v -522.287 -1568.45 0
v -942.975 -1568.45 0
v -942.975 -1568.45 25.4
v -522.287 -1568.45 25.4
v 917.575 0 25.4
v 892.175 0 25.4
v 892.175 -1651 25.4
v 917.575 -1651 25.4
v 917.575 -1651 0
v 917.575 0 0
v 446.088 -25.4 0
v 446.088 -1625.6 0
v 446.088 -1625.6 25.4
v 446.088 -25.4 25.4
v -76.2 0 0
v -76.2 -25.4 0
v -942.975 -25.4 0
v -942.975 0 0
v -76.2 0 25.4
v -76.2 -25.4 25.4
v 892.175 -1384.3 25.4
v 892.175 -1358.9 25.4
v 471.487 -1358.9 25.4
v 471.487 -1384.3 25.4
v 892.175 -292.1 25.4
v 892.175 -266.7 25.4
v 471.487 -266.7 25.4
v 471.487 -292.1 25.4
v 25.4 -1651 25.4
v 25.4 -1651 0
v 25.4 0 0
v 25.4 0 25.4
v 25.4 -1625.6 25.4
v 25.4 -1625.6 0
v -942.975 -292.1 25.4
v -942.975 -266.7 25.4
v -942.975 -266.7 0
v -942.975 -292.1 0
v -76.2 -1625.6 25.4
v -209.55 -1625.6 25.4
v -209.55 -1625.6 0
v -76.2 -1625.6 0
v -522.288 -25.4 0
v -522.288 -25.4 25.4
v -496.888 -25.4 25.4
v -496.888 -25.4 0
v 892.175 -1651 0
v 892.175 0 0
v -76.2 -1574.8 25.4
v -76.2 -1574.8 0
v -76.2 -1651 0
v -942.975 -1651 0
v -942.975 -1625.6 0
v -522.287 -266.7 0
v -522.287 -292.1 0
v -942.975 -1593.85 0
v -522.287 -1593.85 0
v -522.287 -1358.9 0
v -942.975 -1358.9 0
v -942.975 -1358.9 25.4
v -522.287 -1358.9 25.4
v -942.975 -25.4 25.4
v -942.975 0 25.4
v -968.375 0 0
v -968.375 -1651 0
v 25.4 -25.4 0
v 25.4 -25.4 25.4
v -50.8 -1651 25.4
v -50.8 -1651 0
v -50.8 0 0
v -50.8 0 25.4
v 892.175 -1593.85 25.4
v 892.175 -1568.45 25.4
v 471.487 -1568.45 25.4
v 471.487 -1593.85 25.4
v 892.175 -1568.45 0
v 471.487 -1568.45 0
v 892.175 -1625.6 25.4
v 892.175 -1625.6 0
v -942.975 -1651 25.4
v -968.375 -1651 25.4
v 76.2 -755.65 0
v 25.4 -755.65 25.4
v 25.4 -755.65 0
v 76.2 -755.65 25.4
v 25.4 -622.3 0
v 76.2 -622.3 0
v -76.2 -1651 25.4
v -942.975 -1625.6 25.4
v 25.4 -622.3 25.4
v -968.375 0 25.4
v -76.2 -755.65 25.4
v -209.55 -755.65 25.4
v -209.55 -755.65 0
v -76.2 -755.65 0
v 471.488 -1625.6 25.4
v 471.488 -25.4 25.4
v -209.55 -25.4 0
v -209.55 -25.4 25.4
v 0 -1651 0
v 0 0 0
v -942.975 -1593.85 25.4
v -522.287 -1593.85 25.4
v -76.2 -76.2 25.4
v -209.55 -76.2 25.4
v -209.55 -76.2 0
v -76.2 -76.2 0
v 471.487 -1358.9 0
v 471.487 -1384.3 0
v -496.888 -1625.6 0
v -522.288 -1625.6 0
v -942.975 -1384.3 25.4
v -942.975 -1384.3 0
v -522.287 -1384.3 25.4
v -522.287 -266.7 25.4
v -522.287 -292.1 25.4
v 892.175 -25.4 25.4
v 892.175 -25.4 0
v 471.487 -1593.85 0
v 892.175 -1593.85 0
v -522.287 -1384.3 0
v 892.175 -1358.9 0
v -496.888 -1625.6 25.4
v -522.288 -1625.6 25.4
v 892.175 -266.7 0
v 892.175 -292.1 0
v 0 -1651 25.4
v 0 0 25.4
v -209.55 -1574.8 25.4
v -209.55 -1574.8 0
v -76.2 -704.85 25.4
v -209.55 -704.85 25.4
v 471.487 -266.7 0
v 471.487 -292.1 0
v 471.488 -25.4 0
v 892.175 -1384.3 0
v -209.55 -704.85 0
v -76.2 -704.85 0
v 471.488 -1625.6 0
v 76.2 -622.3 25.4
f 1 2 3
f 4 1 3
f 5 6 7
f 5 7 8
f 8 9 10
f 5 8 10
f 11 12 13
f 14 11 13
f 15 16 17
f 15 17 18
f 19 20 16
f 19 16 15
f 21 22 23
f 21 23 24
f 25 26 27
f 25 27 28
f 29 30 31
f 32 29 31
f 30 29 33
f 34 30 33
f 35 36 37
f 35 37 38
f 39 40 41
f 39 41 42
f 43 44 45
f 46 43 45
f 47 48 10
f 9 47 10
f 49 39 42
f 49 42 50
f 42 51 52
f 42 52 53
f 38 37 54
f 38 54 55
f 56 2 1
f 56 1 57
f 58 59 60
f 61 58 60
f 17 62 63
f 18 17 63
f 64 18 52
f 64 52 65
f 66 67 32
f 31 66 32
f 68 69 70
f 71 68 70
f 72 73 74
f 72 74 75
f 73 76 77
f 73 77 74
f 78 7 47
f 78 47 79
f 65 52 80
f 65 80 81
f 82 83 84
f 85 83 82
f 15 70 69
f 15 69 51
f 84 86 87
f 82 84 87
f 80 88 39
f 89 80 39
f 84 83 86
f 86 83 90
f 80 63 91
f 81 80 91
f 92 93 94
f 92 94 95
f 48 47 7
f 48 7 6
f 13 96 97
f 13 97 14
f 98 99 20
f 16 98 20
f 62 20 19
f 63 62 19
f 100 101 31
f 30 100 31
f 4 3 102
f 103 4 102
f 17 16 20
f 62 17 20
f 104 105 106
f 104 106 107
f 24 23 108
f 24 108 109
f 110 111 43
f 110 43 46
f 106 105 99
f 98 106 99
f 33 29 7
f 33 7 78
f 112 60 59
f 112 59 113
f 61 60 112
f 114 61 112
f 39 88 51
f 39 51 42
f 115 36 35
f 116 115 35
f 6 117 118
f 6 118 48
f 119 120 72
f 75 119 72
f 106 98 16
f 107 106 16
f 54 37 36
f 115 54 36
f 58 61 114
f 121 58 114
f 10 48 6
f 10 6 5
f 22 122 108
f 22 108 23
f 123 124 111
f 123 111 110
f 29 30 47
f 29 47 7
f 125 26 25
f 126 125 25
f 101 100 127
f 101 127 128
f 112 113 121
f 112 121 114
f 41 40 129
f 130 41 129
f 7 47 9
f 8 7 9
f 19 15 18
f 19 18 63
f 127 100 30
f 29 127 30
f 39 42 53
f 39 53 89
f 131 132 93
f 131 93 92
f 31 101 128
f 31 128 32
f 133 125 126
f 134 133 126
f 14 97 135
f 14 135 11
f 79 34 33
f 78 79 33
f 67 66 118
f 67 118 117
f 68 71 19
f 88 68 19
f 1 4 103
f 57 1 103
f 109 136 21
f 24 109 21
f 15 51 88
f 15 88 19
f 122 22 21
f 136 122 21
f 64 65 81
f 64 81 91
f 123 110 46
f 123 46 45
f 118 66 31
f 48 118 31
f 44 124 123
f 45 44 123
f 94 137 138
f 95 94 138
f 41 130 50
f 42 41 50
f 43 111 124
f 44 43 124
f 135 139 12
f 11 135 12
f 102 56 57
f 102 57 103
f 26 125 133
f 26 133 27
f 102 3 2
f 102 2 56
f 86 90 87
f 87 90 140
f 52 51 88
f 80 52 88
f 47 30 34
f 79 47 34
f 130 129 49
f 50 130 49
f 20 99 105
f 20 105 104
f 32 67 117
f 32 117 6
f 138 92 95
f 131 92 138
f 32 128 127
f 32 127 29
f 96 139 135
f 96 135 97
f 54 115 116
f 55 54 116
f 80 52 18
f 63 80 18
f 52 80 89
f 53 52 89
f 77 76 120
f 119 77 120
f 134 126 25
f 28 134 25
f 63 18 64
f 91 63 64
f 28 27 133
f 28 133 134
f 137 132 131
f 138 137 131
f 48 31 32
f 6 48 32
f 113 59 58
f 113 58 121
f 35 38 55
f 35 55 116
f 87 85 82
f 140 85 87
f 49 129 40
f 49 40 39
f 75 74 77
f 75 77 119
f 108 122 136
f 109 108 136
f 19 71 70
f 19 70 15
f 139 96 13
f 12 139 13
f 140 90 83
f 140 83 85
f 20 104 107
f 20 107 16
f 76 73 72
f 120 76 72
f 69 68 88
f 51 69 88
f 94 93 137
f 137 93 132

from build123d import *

# Parameters (mm, degrees)
F0_W      = 25.4
F0_H      = 1651
F1_DEPTH  = 25.4
F2_W      = 25.4
F2_H      = 25.4
F3_DEPTH  = 866.775
F4_W      = 25.4
F4_H      = 25.4
F5_DEPTH  = 1600.2
F6_W      = 25.4
F6_H      = 25.4
F7_DEPTH  = 420.6875
F10_W     = 133.35
F10_H     = 50.8
F10_W_2   = 50.8
F10_H_2   = 133.35
F11_DEPTH = 25.4


with BuildPart() as f1:
    # F0 (on Top) → F1 (new body)
    with BuildSketch(Plane.XY):
        with Locations((12.7, -825.5)):
            Rectangle(F0_W, F0_H)
        with Locations((904.875, -825.5)):
            Rectangle(F0_W, F0_H)
    extrude(amount=F1_DEPTH)


with BuildPart() as f3:
    # F2 (on face) → F3 (new body, through all)
    with BuildSketch(Plane.YZ.offset(25.4)):
        with Locations((-12.7, 12.7)):
            Rectangle(F2_W, F2_H)
        with Locations((-1638.3, 12.7)):
            Rectangle(F2_W, F2_H)
    extrude(amount=F3_DEPTH)


with BuildPart() as f5:
    # F4 (on face) → F5 (new body, through all)
    with BuildSketch(Plane(origin=(0, -1625.6, 0), x_dir=(-1, 0, 0), z_dir=(0, 1, 0))):
        with Locations((-458.7875, 12.7)):
            Rectangle(F4_W, F4_H)
    extrude(amount=F5_DEPTH)


with BuildPart() as f7:
    # F6 (on face) → F7 (new body, through all)
    with BuildSketch(Plane(origin=(892.175, 0, 0), x_dir=(0, -1, 0), z_dir=(-1, 0, 0))):
        with Locations((279.4, 12.7)):
            Rectangle(F6_W, F6_H)
        with Locations((1581.15, 12.7)):
            Rectangle(F6_W, F6_H)
        with Locations((1371.6, 12.7)):
            Rectangle(F6_W, F6_H)
    extrude(amount=F7_DEPTH)


with BuildPart() as f9_1:
    # F9: instance of F1
    add(f1.part.mirror(Plane(origin=(-25.4, -825.5, 12.7), x_dir=(0, -1, 0), z_dir=(-1, 0, 0))))


with BuildPart() as f9_2:
    # F9: instance of F7
    add(f7.part.mirror(Plane(origin=(-25.4, -825.5, 12.7), x_dir=(0, -1, 0), z_dir=(-1, 0, 0))))


with BuildPart() as f9_3:
    # F9: instance of F5
    add(f5.part.mirror(Plane(origin=(-25.4, -825.5, 12.7), x_dir=(0, -1, 0), z_dir=(-1, 0, 0))))


with BuildPart() as f9_4:
    # F9: instance of F3
    add(f3.part.mirror(Plane(origin=(-25.4, -825.5, 12.7), x_dir=(0, -1, 0), z_dir=(-1, 0, 0))))


with BuildPart() as f11:
    # F10 (on face) → F11 (new body)
    with BuildSketch(Plane.XY.offset(25.4)):
        with Locations((-142.875, -50.8)):
            Rectangle(F10_W, F10_H)
        with Locations((-142.875, -1600.2)):
            Rectangle(F10_W, F10_H)
        with Locations((-142.875, -730.25)):
            Rectangle(F10_W, F10_H)
        with Locations((50.8, -688.975)):
            Rectangle(F10_W_2, F10_H_2)
    extrude(amount=-F11_DEPTH)


solid = Compound([f1.part, f3.part, f5.part, f7.part, f9_1.part, f9_2.part, f9_3.part, f9_4.part, f11.part])
